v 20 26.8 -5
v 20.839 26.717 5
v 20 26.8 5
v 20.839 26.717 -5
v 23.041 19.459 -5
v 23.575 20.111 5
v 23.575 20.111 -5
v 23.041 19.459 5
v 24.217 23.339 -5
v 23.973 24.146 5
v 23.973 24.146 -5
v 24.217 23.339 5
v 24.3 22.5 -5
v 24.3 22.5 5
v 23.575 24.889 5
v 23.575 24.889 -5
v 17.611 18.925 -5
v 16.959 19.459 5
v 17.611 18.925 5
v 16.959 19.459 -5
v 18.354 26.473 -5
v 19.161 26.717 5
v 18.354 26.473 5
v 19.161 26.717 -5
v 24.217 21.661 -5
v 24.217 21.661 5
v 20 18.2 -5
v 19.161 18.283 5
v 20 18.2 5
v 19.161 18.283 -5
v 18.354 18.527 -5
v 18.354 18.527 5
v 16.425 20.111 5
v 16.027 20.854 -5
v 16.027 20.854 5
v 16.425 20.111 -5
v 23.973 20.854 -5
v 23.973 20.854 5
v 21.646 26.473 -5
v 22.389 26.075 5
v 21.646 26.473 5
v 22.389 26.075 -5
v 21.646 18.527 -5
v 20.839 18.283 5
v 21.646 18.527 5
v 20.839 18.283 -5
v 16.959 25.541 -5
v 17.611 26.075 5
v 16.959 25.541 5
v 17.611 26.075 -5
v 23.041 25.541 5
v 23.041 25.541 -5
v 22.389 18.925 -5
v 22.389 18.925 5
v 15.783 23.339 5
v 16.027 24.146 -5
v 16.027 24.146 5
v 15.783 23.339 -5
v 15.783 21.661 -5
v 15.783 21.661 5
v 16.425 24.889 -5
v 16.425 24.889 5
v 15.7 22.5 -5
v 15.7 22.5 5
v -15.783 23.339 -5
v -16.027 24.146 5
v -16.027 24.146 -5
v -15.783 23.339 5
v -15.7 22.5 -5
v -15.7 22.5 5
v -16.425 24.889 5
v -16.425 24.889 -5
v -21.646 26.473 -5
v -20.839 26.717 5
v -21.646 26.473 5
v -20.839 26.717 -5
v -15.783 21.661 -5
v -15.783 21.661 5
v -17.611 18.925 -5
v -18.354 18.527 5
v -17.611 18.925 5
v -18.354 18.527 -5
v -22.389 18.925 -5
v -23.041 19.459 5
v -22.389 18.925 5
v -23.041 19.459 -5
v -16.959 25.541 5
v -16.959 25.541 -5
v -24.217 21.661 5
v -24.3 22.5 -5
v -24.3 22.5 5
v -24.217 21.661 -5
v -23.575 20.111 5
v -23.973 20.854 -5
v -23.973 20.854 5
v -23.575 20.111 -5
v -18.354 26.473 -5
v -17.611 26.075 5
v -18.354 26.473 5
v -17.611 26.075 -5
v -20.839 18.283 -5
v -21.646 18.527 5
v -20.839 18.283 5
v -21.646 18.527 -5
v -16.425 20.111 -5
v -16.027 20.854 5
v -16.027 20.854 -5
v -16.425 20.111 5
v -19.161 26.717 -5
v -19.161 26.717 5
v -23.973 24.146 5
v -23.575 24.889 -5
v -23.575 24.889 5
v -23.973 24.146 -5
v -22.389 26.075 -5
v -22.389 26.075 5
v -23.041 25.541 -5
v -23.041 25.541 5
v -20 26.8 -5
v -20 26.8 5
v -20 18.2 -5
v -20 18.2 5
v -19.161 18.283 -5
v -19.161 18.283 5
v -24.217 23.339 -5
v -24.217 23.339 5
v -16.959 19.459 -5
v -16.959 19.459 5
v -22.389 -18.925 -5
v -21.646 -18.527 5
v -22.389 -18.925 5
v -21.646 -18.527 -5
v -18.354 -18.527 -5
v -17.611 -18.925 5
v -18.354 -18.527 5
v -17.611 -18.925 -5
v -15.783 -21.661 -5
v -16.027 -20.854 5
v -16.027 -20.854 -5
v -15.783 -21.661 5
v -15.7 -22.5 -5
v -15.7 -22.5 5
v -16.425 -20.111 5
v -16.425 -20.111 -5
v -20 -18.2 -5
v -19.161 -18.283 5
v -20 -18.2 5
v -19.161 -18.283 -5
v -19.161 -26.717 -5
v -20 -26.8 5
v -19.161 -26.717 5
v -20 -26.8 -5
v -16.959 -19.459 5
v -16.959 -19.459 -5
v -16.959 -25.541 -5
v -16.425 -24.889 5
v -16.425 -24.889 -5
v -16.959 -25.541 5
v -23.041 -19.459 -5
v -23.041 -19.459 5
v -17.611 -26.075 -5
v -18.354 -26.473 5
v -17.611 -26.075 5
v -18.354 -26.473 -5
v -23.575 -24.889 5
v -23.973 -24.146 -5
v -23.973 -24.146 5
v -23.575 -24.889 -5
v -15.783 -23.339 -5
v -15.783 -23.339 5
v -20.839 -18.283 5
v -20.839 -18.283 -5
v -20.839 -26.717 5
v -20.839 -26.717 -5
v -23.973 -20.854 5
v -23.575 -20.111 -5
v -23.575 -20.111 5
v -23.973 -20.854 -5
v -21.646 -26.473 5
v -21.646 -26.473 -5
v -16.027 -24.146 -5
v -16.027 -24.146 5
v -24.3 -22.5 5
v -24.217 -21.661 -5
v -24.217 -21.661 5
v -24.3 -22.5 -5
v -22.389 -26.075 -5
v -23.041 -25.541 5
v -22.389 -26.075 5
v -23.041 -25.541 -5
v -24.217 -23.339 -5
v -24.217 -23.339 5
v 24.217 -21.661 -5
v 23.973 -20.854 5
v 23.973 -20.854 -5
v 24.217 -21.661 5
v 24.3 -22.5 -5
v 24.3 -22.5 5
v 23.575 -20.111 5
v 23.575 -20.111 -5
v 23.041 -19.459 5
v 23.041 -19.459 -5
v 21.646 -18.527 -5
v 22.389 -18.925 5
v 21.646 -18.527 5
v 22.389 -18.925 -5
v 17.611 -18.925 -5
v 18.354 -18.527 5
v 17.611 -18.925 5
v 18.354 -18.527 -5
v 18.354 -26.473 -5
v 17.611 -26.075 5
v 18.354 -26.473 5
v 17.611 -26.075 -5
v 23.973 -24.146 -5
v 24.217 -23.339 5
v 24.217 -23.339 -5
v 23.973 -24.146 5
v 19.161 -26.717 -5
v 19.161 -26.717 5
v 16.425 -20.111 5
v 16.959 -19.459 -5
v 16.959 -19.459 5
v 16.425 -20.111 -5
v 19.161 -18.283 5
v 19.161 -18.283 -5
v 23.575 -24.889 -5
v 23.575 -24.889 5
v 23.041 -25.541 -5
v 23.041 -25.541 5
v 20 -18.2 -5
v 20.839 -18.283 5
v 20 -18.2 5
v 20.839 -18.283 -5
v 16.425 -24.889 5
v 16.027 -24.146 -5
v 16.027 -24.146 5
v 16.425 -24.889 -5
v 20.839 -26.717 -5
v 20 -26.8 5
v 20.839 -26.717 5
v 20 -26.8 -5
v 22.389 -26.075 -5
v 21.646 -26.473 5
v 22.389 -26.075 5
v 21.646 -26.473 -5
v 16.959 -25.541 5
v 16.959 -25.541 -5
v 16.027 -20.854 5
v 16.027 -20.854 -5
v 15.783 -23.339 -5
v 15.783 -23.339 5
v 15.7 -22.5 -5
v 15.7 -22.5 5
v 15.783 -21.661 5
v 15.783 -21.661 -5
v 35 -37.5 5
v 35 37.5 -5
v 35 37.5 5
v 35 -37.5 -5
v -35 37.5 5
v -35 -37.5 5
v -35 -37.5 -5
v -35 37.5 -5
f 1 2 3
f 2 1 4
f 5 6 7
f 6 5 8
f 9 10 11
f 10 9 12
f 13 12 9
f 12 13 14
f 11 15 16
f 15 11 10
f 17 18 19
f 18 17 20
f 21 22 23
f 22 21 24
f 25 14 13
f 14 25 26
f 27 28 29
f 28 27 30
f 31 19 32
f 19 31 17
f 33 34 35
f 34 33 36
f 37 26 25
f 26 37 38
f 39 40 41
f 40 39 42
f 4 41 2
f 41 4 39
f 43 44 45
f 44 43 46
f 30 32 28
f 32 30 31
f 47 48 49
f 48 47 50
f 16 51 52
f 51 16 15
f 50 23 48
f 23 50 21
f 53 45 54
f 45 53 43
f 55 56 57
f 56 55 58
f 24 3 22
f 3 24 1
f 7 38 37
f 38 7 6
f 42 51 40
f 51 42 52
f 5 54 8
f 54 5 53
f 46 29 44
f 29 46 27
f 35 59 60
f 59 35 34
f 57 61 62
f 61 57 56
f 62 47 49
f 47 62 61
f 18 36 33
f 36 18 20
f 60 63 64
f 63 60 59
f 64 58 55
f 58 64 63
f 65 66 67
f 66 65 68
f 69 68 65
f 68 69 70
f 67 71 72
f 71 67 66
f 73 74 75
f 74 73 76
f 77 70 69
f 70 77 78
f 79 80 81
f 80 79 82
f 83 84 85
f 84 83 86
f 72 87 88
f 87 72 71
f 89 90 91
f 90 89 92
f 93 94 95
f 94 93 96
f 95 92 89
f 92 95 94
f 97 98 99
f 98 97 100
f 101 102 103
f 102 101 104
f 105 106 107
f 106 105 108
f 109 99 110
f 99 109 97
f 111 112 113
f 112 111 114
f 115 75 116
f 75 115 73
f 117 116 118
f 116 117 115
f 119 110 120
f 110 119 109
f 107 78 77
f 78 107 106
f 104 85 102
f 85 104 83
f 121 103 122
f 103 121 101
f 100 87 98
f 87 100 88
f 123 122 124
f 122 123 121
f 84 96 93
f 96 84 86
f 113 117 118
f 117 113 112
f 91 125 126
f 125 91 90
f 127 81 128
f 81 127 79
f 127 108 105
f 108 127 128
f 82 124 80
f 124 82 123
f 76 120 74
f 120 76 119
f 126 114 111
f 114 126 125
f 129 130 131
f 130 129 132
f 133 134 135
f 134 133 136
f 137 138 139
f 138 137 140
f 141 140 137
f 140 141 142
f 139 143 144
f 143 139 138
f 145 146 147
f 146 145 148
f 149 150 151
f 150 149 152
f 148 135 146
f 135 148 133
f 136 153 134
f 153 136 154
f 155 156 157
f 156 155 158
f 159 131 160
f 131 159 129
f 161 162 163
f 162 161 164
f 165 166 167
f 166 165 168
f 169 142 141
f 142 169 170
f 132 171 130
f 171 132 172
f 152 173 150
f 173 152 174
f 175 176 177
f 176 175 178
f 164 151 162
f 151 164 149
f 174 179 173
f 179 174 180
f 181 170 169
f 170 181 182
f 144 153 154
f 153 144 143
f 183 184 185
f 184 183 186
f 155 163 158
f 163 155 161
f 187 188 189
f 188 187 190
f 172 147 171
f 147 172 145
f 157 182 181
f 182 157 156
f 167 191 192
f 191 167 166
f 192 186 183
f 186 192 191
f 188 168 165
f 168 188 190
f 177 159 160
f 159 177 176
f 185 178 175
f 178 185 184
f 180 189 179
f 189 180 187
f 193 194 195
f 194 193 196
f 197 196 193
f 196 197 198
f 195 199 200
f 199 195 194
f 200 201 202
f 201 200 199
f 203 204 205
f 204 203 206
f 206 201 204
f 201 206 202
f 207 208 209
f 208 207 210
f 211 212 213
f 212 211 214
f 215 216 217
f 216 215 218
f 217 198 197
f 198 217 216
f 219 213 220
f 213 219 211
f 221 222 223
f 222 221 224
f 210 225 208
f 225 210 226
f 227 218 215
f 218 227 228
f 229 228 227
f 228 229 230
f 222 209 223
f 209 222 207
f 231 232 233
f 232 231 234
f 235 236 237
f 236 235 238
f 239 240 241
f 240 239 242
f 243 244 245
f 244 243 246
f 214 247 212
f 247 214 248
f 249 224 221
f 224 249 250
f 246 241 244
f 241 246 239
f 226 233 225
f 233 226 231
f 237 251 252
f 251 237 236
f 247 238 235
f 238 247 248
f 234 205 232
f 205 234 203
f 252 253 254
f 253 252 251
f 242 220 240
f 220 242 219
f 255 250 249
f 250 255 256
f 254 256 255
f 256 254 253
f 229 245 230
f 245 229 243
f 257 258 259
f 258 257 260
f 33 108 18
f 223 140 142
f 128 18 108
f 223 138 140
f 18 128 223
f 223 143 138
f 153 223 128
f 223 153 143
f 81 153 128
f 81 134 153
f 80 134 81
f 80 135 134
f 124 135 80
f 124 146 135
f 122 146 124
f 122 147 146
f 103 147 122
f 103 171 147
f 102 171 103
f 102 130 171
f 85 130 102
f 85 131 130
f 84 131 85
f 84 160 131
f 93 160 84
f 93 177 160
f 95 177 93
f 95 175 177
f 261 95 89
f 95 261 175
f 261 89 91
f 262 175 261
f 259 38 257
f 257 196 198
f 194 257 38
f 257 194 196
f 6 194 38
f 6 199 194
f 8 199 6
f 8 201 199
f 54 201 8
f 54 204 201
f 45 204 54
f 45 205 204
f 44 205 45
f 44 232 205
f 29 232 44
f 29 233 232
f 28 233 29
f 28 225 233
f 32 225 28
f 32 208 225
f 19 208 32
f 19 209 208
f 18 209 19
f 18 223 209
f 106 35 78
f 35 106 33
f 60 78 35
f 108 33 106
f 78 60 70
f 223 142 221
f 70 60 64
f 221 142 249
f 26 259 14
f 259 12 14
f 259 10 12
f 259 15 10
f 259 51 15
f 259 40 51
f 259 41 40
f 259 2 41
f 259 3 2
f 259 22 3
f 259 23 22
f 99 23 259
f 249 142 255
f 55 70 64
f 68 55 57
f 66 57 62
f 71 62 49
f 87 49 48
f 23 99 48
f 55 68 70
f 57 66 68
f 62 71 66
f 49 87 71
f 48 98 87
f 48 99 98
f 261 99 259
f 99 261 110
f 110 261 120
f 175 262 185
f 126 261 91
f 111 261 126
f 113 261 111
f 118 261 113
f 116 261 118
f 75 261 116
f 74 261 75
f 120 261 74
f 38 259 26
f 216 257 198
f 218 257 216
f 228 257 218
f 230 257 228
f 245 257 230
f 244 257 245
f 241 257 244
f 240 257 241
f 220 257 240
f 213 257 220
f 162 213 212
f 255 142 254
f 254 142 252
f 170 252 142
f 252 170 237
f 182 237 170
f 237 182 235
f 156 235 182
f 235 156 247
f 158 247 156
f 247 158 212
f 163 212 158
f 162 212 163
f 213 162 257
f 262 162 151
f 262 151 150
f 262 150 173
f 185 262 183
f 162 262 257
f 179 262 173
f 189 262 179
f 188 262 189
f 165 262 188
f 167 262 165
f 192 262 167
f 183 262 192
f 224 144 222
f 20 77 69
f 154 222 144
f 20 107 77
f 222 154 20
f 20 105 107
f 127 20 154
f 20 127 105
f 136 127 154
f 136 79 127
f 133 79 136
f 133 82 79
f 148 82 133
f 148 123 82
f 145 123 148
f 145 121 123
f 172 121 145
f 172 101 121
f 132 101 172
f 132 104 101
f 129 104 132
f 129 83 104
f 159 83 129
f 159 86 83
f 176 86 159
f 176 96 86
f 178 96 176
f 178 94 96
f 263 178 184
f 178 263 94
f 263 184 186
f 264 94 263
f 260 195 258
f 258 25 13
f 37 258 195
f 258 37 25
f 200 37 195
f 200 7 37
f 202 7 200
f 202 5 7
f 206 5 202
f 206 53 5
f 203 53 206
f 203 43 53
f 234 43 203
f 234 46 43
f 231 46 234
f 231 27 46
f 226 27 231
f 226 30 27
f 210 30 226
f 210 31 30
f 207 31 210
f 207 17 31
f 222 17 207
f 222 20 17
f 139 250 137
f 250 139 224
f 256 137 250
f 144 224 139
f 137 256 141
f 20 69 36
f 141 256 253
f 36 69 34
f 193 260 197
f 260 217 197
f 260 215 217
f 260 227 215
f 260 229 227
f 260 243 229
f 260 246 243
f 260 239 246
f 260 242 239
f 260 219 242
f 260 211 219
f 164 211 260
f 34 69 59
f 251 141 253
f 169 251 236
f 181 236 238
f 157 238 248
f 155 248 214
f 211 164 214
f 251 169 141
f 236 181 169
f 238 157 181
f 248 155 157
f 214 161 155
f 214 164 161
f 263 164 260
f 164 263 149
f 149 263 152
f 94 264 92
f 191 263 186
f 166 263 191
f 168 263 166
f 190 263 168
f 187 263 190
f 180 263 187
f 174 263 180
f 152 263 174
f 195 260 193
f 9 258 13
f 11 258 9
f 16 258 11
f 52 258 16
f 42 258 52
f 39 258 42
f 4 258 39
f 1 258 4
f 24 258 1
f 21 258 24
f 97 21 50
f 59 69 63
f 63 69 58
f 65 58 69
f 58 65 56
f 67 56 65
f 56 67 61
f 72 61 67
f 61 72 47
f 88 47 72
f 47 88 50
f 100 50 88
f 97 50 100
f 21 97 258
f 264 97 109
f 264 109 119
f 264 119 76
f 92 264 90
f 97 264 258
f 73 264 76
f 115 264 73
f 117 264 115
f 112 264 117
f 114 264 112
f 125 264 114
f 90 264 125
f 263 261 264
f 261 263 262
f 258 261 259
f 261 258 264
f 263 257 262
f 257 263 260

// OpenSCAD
$fn = 32;

// ----------------------------------------------------------------------
// Corner plate 70 x 75 x 10
// 4 holes, centres taken from the edge offset
// ----------------------------------------------------------------------

// --- parameters (mm) ---
plate = [70, 75, 10];   // overall size (x, y, z)
holes = 4;              // number of holes the drawing asks for
bore_d = 8.4;           // nominal hole diameter from the drawing
print_allowance = 0.2;  // clearance added for printing
edge = 15;              // hole centre offset from the plate edge

// --- derived feature positions (mm) ---
hole_d = bore_d + print_allowance;  // = 8.6   hole diameter as printed
corner_x = plate[0] / 2 - edge;     // = 20   corner hole X
corner_y = plate[1] / 2 - edge;     // = 22.5   corner hole Y
feature_centers = [
  [corner_x, corner_y],
  [-corner_x, corner_y],
  [-corner_x, -corner_y],
  [corner_x, -corner_y]
];   // hole centres the loop below drills

// plate outline, every hole drilled through with the same cutters
difference() {
  cube(plate, center = true);
  for (centre = feature_centers)
    translate([centre[0], centre[1], 0])
      cylinder(d = hole_d, h = plate[2] + 2, center = true);
}
